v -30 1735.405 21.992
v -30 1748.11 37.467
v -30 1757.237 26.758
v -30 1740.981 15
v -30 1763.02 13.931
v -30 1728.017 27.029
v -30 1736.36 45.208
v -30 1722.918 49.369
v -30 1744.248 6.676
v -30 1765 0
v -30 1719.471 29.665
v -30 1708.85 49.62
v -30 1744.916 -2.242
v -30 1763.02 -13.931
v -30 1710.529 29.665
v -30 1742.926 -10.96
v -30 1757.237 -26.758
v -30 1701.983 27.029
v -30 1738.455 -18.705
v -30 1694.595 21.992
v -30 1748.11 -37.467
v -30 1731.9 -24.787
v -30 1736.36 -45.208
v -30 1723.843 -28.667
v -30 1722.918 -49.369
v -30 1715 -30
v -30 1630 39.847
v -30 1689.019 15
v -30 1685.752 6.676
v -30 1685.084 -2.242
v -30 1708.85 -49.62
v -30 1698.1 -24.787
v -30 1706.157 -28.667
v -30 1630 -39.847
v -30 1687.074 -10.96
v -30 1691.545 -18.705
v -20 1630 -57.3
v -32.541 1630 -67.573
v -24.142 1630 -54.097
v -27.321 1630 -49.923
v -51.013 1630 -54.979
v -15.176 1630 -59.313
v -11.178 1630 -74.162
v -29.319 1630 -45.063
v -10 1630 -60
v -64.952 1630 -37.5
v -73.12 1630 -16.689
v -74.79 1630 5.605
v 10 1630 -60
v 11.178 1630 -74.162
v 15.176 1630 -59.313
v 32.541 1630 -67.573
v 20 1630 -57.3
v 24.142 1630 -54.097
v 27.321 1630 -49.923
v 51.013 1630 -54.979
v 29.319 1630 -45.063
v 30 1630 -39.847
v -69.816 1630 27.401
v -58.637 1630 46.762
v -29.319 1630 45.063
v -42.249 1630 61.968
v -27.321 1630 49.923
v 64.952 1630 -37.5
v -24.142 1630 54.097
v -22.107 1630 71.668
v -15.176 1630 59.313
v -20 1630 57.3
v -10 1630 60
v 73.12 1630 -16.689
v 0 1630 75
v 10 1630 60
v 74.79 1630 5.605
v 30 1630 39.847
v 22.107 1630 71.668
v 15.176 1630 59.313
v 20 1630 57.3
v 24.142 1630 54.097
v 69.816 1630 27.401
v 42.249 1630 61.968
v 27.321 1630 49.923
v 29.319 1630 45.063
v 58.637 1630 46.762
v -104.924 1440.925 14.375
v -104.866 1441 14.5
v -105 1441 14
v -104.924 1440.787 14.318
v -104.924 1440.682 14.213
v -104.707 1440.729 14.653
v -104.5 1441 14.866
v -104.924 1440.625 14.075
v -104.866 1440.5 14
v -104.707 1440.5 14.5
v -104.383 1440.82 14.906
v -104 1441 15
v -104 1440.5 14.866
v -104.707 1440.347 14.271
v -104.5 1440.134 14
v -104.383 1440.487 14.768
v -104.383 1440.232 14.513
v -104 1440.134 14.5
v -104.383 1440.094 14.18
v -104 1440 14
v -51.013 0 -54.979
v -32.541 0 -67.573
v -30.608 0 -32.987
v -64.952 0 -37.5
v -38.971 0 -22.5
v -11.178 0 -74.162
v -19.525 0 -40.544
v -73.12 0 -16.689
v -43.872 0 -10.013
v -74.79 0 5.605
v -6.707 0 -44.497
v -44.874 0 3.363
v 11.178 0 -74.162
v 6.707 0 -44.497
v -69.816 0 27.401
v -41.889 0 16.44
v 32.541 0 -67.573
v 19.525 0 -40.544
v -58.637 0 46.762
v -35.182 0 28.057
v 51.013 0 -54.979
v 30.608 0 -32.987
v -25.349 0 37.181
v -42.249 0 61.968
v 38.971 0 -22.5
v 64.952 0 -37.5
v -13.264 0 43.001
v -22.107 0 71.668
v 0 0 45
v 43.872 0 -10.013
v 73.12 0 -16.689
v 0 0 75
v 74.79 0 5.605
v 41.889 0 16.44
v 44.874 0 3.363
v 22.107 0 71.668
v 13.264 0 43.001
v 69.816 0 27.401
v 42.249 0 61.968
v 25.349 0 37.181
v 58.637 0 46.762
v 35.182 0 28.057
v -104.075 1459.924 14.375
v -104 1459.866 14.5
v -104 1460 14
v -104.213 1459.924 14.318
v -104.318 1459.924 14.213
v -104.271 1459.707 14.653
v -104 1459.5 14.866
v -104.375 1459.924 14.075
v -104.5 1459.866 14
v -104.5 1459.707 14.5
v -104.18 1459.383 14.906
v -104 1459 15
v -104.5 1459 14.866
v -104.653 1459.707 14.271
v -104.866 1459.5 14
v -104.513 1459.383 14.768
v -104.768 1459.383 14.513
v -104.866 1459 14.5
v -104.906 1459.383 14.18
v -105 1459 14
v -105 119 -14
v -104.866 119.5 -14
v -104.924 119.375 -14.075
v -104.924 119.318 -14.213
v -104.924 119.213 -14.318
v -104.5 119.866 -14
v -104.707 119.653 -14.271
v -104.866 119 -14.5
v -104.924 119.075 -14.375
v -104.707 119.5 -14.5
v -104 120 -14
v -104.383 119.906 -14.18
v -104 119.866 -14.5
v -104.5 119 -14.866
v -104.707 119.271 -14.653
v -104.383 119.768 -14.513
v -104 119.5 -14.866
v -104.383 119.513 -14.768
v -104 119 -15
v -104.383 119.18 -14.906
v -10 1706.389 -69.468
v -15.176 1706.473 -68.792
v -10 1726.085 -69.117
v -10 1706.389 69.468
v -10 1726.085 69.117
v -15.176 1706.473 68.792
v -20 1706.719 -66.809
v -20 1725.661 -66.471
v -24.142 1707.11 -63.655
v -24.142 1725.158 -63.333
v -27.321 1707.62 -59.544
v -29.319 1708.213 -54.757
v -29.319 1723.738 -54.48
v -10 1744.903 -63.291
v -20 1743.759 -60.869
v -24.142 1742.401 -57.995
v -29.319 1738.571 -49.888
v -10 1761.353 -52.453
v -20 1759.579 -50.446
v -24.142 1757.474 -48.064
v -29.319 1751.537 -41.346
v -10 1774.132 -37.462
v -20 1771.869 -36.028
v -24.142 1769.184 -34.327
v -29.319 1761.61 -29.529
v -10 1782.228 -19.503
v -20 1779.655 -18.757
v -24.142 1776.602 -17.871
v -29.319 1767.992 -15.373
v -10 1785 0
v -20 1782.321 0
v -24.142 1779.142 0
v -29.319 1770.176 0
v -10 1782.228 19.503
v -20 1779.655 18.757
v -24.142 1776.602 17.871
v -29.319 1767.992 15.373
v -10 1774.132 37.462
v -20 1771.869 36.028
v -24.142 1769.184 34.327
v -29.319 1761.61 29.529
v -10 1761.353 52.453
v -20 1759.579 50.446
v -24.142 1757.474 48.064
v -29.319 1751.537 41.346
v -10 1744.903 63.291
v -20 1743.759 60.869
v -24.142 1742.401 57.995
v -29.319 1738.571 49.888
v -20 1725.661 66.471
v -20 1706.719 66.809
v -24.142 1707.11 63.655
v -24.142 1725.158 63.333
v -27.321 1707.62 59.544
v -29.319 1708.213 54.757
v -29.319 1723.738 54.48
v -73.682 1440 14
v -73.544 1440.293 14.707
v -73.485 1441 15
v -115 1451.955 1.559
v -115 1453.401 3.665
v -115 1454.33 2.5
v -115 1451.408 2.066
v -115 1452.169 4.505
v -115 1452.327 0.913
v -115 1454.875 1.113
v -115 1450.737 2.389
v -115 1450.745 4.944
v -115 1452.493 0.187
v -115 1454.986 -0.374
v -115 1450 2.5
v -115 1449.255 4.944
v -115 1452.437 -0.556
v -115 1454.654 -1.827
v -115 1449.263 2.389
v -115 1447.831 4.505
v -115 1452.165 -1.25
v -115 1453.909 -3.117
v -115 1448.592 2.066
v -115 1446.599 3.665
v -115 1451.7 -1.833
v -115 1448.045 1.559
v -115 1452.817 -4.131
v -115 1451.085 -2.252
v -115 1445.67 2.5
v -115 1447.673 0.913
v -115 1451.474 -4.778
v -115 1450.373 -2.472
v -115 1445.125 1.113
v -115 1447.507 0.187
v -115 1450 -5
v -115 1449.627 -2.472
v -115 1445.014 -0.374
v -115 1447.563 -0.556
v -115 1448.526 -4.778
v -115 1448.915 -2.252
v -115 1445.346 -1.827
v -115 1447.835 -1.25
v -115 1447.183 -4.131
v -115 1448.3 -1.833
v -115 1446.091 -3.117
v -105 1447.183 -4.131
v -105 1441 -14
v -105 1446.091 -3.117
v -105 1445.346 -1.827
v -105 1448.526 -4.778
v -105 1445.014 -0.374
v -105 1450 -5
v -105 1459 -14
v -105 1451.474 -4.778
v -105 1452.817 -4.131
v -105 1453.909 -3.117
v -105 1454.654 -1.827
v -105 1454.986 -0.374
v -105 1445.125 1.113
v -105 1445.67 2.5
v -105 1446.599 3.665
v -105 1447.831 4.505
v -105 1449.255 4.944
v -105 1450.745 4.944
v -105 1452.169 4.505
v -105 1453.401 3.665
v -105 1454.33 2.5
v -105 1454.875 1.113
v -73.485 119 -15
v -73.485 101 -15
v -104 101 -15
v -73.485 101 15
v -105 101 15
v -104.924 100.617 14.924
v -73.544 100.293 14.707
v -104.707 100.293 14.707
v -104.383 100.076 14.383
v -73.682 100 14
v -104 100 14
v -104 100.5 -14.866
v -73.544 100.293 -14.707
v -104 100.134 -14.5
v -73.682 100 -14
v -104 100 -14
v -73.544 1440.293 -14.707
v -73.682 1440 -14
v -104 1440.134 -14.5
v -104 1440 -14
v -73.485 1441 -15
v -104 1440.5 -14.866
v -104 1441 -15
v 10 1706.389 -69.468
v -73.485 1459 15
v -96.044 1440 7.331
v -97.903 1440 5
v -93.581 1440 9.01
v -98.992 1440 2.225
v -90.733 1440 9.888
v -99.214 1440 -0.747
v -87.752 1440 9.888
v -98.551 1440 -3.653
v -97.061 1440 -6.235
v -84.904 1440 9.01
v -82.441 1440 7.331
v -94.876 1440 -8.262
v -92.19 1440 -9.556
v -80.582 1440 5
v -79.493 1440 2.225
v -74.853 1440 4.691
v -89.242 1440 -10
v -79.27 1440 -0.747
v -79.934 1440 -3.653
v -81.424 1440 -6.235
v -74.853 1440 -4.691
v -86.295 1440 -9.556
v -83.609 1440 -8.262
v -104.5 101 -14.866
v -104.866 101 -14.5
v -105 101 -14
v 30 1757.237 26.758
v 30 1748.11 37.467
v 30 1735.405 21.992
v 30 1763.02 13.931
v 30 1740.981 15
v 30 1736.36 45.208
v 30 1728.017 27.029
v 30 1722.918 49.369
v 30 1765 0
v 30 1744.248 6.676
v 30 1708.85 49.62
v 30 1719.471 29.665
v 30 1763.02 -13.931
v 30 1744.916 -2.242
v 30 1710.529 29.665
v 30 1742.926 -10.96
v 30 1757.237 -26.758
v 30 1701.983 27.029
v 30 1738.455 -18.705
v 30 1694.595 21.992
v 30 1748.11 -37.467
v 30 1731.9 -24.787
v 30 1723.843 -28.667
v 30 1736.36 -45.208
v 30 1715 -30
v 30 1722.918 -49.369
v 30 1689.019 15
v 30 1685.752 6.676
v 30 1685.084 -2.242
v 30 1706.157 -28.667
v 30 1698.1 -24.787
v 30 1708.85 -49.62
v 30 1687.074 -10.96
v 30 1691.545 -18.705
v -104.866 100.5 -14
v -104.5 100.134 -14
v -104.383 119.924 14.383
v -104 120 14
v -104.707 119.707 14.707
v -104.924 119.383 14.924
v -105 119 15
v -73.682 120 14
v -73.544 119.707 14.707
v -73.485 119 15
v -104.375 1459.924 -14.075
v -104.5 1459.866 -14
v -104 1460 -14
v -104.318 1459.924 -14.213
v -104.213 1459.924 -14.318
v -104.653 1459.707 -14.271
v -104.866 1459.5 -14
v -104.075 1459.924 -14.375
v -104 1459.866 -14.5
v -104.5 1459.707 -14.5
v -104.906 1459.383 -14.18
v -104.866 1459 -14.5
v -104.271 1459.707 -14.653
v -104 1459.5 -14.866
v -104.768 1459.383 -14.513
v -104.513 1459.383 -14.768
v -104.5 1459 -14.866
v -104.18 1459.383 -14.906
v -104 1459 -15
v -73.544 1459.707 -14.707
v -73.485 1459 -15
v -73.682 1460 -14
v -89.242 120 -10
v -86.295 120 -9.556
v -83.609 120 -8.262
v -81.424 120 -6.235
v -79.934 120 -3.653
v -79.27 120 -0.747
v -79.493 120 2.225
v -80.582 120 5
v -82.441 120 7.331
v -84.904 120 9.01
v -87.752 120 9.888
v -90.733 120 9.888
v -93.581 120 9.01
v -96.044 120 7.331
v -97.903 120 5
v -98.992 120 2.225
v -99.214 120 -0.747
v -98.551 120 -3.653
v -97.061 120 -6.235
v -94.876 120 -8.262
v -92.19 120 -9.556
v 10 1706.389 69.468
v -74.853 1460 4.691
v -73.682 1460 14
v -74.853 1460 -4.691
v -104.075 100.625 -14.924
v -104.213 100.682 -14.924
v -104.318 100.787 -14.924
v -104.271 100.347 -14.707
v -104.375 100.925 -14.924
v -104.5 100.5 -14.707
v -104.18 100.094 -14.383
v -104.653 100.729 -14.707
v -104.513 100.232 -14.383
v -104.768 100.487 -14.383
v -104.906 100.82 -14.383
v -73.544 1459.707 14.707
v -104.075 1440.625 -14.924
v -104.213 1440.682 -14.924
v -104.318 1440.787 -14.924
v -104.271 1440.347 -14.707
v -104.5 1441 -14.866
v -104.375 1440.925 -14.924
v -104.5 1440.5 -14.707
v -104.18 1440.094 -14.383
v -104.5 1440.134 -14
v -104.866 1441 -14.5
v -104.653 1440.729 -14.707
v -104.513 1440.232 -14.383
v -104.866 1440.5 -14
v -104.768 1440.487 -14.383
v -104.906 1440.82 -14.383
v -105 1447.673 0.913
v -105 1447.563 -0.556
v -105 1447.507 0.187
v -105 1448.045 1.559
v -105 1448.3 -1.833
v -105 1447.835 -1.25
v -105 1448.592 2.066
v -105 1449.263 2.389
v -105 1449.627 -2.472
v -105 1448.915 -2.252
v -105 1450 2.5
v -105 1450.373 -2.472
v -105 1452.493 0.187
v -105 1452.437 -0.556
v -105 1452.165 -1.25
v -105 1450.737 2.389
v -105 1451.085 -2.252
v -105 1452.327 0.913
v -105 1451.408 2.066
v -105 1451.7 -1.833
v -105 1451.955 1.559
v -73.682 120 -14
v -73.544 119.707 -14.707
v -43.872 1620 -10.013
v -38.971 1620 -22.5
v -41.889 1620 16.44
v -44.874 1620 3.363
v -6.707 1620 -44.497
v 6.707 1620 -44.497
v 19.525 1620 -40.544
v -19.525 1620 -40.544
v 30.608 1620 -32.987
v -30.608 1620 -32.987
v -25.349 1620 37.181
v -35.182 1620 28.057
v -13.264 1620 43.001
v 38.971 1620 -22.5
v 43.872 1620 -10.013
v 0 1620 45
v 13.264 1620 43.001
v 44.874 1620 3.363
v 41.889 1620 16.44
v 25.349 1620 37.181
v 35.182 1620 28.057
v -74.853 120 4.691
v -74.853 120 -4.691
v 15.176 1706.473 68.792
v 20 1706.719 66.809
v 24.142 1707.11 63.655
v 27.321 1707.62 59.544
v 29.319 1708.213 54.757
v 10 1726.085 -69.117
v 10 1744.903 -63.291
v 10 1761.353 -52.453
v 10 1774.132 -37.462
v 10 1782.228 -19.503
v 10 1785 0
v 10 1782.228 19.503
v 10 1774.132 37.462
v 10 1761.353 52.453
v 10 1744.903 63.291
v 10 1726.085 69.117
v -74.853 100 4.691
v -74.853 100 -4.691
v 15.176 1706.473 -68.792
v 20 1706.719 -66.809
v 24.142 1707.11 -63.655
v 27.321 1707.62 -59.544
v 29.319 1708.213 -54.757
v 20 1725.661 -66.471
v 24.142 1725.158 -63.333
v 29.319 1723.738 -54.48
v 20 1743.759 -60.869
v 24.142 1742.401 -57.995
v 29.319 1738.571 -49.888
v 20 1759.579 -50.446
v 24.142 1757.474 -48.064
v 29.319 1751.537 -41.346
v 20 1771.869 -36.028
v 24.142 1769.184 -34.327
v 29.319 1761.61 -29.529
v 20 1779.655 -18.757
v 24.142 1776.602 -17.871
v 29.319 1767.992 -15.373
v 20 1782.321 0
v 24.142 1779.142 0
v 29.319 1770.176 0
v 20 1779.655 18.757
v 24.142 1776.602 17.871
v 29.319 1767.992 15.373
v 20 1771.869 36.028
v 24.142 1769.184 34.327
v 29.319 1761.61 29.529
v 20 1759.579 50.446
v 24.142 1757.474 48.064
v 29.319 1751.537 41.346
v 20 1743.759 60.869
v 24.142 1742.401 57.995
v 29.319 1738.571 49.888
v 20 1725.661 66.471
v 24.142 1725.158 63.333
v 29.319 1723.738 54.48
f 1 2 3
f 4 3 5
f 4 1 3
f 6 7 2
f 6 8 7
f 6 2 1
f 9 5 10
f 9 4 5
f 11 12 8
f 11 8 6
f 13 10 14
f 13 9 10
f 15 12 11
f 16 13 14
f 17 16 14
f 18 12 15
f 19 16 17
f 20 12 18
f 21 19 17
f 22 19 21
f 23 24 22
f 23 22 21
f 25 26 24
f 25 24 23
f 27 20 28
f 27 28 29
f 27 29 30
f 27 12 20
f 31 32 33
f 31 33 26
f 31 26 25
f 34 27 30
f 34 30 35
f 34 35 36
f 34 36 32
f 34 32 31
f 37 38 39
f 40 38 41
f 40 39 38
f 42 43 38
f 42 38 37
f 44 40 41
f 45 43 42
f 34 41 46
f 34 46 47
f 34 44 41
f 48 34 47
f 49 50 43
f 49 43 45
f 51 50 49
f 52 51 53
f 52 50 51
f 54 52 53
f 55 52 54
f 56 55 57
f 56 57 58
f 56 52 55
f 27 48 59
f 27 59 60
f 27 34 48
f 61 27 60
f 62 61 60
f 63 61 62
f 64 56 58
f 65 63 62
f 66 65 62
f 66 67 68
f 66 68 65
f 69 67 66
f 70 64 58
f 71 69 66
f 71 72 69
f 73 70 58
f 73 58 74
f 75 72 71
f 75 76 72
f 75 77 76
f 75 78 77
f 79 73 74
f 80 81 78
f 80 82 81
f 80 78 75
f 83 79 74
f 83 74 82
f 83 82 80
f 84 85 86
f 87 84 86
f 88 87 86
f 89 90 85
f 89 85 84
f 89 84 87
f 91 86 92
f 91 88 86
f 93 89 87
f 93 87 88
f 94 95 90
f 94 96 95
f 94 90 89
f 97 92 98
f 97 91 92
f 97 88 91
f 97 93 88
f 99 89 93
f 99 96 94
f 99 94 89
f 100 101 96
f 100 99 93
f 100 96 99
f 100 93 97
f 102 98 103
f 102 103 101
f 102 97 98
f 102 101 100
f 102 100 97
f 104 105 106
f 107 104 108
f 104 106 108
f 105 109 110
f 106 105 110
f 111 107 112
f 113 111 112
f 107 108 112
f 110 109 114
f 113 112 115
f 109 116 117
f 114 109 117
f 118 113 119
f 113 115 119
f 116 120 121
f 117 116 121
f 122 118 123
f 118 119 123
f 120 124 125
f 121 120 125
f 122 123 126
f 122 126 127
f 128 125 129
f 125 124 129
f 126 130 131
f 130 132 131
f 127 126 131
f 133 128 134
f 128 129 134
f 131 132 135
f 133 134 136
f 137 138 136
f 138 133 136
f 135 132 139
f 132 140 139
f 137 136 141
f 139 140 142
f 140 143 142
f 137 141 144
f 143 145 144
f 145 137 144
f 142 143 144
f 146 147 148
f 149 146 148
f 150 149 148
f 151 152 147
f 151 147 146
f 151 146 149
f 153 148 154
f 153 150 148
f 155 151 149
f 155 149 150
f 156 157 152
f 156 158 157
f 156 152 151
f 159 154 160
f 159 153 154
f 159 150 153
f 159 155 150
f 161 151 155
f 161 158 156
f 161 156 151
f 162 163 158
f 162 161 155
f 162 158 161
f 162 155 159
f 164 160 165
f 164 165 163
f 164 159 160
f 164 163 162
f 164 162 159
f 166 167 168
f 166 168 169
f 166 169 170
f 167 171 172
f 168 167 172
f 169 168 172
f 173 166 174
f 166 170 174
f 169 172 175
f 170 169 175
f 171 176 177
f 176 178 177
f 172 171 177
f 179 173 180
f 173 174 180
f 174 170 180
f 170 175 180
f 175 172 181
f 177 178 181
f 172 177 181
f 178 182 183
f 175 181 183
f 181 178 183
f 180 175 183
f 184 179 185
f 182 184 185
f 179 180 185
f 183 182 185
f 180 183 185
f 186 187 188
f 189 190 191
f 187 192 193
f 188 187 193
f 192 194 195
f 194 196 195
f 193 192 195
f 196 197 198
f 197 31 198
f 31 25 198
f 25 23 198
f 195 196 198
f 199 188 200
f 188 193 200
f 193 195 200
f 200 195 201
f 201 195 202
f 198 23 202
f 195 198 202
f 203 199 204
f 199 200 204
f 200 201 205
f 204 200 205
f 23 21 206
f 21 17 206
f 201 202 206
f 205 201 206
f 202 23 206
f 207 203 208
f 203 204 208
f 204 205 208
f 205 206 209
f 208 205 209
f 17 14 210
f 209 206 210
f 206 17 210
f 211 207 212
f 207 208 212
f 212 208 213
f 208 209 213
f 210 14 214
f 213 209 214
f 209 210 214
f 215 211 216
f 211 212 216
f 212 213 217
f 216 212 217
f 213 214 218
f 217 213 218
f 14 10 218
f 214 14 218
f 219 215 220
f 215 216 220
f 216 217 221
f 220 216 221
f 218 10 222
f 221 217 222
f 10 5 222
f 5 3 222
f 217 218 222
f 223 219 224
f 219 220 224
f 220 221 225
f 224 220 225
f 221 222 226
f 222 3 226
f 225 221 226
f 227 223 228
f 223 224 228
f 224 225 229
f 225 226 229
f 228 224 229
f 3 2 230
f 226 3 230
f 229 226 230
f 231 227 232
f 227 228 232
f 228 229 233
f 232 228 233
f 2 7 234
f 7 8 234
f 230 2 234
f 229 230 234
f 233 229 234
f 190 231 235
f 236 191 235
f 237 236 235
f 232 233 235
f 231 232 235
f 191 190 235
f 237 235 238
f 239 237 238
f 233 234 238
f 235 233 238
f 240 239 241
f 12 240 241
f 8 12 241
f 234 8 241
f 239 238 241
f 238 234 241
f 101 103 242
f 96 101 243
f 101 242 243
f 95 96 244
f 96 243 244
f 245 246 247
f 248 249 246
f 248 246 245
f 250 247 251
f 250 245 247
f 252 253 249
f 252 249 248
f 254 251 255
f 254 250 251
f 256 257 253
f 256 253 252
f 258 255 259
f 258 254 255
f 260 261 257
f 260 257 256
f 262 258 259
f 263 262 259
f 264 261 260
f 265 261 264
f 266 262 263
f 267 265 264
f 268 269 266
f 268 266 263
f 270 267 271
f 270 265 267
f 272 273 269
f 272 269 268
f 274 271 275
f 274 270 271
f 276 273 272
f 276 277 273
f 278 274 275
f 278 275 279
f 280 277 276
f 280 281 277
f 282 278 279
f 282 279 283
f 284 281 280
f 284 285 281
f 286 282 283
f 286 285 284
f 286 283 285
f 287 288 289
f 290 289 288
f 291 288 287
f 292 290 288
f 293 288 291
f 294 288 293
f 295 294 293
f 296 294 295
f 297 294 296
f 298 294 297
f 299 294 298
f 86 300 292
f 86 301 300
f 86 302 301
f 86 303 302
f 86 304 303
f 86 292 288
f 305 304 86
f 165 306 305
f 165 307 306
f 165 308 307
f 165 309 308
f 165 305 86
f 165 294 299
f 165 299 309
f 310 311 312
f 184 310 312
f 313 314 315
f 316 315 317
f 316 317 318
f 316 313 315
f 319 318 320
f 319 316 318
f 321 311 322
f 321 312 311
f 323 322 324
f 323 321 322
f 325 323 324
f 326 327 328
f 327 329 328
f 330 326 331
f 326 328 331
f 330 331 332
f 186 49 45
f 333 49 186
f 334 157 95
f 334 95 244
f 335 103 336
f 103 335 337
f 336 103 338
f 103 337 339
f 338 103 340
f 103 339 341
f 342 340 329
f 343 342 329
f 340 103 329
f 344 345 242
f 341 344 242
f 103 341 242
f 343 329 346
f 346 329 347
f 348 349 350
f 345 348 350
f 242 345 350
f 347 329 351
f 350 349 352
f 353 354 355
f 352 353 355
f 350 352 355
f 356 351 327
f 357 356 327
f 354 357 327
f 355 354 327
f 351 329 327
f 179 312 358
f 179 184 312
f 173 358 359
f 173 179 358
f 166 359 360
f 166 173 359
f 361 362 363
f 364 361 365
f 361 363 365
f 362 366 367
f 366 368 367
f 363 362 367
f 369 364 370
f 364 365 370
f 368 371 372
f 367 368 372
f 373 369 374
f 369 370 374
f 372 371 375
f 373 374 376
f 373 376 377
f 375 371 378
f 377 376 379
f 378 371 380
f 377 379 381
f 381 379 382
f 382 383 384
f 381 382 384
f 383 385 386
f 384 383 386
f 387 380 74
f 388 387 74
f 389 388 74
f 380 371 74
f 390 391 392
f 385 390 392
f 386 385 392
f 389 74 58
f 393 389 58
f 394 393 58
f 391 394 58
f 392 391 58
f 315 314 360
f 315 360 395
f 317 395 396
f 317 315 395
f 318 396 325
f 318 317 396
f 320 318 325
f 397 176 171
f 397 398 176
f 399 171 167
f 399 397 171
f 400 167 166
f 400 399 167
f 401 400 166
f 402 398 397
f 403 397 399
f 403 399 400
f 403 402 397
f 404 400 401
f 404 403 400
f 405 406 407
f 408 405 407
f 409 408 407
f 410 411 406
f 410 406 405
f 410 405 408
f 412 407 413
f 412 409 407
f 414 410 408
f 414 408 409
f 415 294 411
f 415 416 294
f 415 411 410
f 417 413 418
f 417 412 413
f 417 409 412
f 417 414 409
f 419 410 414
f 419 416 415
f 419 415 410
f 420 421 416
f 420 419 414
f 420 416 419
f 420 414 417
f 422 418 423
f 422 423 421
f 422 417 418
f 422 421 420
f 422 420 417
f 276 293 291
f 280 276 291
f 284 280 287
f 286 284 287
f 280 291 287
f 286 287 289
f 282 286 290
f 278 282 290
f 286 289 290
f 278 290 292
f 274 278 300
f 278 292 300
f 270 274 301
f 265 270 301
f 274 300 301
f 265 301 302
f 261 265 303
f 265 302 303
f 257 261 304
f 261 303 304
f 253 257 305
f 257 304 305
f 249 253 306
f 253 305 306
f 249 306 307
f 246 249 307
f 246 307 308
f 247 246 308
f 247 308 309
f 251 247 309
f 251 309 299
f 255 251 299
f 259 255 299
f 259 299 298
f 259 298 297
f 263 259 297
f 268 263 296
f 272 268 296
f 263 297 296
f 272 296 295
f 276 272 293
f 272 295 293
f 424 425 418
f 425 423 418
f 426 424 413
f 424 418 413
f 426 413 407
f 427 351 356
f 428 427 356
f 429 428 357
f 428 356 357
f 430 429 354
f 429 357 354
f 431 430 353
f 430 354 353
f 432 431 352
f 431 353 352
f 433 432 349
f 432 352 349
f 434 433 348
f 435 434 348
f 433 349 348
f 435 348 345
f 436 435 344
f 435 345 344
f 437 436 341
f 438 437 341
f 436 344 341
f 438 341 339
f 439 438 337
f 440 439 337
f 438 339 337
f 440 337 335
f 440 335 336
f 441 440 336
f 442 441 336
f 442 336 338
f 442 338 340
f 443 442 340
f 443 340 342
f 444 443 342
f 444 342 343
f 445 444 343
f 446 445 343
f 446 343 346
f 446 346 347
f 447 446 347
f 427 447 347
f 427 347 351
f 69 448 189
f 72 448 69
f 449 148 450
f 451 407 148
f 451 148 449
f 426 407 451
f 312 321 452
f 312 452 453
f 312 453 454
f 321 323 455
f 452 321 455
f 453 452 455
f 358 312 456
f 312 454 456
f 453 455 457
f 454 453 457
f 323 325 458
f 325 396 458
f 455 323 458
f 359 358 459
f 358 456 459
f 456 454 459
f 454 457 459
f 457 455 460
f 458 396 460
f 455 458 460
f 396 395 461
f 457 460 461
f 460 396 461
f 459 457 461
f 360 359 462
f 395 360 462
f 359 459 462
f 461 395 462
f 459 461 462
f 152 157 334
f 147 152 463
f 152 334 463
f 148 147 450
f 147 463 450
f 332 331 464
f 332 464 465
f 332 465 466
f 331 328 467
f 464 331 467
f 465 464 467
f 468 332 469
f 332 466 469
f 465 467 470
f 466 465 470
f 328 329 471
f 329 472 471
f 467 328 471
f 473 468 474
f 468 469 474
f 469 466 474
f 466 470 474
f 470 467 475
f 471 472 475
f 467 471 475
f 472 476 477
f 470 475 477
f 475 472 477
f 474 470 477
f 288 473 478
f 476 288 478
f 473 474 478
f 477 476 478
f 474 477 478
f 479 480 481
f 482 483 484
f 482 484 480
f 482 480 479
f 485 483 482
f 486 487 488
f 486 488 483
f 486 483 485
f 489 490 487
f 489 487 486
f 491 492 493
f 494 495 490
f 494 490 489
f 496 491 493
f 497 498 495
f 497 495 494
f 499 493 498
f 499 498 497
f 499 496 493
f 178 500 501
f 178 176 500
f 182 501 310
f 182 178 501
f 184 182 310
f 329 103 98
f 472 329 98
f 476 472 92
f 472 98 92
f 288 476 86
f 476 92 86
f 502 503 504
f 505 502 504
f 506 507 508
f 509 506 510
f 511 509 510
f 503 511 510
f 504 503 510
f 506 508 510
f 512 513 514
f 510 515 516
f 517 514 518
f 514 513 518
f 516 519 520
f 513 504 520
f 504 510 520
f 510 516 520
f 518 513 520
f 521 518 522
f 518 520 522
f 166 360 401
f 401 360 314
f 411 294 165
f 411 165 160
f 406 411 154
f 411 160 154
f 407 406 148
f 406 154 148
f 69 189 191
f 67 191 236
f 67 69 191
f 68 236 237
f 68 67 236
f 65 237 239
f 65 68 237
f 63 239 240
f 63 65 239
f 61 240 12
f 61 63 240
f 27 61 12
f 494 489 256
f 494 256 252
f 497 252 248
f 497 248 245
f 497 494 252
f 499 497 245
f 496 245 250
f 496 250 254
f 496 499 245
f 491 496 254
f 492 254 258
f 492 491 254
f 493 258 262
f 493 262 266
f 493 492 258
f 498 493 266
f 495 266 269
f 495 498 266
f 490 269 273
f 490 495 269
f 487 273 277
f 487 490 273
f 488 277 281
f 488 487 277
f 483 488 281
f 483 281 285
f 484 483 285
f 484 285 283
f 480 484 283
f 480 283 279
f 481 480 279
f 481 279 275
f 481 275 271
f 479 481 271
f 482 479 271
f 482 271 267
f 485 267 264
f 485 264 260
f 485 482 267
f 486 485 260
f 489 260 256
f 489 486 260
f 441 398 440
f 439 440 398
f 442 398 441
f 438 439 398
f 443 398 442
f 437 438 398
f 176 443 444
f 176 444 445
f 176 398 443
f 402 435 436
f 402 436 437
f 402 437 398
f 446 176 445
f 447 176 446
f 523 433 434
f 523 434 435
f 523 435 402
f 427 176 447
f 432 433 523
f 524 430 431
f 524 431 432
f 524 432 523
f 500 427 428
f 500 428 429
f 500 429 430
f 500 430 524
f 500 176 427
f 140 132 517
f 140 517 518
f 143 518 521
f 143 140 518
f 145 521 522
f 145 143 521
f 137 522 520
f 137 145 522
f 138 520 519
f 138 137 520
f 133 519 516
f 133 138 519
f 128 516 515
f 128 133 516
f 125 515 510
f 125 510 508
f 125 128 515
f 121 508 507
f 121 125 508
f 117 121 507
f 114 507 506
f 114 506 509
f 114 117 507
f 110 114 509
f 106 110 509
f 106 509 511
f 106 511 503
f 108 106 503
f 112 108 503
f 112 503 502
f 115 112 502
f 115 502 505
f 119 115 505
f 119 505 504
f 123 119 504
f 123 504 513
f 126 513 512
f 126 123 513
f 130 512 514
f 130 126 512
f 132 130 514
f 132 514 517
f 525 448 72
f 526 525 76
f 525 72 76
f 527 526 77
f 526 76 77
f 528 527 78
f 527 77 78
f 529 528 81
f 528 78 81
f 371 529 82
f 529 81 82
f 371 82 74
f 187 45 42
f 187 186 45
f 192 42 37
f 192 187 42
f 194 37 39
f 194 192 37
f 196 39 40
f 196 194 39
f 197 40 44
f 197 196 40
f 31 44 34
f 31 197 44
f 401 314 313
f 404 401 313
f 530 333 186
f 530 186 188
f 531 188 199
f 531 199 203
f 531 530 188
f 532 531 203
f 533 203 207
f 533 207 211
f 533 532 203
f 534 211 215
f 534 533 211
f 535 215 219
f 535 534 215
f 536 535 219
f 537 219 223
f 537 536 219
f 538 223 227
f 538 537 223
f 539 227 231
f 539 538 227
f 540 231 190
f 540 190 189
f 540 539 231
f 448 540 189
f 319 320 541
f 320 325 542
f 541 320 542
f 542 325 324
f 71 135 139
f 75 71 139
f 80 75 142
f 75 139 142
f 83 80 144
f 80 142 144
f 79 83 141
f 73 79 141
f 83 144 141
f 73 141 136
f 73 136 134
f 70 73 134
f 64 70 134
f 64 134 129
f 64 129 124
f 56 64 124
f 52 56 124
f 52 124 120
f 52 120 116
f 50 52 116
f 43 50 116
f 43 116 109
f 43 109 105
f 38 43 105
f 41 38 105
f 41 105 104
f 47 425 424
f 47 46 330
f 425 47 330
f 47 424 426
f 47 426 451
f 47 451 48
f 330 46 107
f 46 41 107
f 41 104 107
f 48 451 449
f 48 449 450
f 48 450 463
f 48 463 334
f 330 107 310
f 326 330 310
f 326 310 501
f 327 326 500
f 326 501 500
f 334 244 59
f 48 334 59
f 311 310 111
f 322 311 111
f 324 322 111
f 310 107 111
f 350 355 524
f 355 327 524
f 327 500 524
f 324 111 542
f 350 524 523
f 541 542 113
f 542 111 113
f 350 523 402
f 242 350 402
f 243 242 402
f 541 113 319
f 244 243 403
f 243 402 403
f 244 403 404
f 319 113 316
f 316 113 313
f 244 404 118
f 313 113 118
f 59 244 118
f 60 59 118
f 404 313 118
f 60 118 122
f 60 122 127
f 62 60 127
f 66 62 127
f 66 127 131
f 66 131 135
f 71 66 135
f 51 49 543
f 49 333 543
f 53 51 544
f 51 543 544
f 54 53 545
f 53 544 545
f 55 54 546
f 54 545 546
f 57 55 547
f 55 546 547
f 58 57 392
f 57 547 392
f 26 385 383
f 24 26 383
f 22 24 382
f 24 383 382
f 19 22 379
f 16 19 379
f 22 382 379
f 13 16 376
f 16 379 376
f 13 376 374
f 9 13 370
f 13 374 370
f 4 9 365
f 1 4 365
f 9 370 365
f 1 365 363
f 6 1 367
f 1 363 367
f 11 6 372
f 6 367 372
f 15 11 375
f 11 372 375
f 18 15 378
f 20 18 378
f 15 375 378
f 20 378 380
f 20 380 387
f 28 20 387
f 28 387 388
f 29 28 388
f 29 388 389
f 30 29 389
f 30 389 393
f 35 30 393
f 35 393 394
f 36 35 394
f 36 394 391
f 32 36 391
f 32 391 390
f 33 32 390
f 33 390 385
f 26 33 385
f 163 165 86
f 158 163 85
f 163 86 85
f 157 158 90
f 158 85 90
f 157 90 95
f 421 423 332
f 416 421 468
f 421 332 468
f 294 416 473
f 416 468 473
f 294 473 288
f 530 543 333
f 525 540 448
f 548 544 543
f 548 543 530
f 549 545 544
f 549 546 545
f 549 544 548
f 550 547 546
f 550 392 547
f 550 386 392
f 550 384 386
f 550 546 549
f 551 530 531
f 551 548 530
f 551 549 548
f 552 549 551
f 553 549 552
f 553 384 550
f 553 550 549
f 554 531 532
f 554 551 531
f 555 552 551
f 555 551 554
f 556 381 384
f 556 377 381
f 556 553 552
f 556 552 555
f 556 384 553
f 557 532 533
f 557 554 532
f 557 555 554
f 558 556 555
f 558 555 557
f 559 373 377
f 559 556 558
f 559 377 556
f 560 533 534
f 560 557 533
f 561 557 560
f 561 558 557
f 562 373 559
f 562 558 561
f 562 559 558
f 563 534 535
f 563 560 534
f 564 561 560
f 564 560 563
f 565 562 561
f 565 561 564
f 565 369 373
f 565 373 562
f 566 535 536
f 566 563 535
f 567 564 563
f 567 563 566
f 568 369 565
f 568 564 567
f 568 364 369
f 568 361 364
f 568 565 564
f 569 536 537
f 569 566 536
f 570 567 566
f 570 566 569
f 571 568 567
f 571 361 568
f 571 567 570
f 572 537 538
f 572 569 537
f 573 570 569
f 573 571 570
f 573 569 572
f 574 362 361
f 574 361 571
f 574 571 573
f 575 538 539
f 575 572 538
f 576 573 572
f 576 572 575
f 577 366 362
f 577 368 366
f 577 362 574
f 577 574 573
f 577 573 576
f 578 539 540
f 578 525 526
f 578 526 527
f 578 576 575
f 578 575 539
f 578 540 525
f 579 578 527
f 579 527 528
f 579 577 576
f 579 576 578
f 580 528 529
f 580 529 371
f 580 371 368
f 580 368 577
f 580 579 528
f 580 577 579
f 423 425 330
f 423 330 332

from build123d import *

# Parameters (mm, degrees)
SKETCH_1_R          = 75
SKETCH_1_R_2        = 45
EXTRUDE_1_DEPTH     = 1620
SKETCH_2_R          = 75
EXTRUDE_2_DEPTH     = 10
SKETCH_3_W          = 60
SKETCH_3_H          = 150
EXTRUDE_3_DEPTH     = 200
SKETCH_4_R          = 30
CUT_EXTRUDE_1_DEPTH = 1835.543539958
FILLET_1_R          = 20
EXTRUDE_4_DEPTH     = 20
SKETCH_6_R          = 10
EXTRUDE_5_DEPTH     = 660
SKETCH_10_R         = 5
SKETCH_10_R_2       = 2.5
EXTRUDE_6_DEPTH     = 10
FILLET_2_R          = 1


with BuildPart() as part:
    # 草图1 → 凸台-拉伸1 (new body)
    with BuildSketch(Plane(origin=(0, 0, 0), x_dir=(1, 0, 0), z_dir=(0, 1, 0))):
        with Locations(Location((0, 0, 0), (0, 0, 270))):
            Circle(SKETCH_1_R)
        with Locations(Location((0, 0, 0), (0, 0, 270))):
            Circle(SKETCH_1_R_2, mode=Mode.SUBTRACT)
    extrude(amount=EXTRUDE_1_DEPTH)

    # 草图2 → 凸台-拉伸2 (add)
    with BuildSketch(Plane(origin=(0, 1620, 0), x_dir=(1, 0, 0), z_dir=(0, 1, 0))):
        with Locations(Location((0, 0, 0), (0, 0, 270))):
            Circle(SKETCH_2_R)
    extrude(amount=EXTRUDE_2_DEPTH)

    # 草图3 → 凸台-拉伸3 (add)
    with BuildSketch(Plane(origin=(0, 1630, 0), x_dir=(1, 0, 0), z_dir=(0, 1, 0))):
        Rectangle(SKETCH_3_W, SKETCH_3_H)
    extrude(amount=EXTRUDE_3_DEPTH)

    # 草图4 → 切除-拉伸1 (cut, through all)
    with BuildSketch(Plane(origin=(30, 0, 0), x_dir=(0, 0, -1), z_dir=(1, 0, 0))):
        with Locations((0, 1715)):
            Circle(SKETCH_4_R)
        with BuildLine():
            Line((75, 1830), (75, 1630))
            Line((75, 1630), (60, 1630))
            Line((60, 1630), (69.468399859, 1706.389458724))
            ThreePointArc((69.468399859, 1706.389458724), (0, 1785), (-69.468399859, 1706.389458724))
            Line((-69.468399859, 1706.389458724), (-60, 1630))
            Line((-60, 1630), (-75, 1630))
            Line((-75, 1630), (-75, 1830))
            Line((-75, 1830), (75, 1830))
        make_face()
    extrude(amount=-CUT_EXTRUDE_1_DEPTH, mode=Mode.SUBTRACT)

    # 圆角1
    fillet_1_edges = [part.edges().sort_by_distance(p)[0] for p in [
        (-30, 1785, 0),
        (-30, 1668.194729362, 64.734199929),
        (-30, 1668.194729362, -64.734199929),
        (30, 1785, 0),
        (30, 1668.194729362, -64.734199929),
        (30, 1668.194729362, 64.734199929),
    ]]
    fillet(fillet_1_edges, radius=FILLET_1_R)

    # 草图5 → 凸台-拉伸4 (add)
    with BuildSketch(Plane(origin=(0, 100, 0), x_dir=(-1, 0, 0), z_dir=(0, -1, 0))):
        with BuildLine():
            Line((73.484692283, 15), (105, 15))
            Line((105, 15), (105, -15))
            Line((105, -15), (73.484692283, -15))
            ThreePointArc((73.484692283, -15), (75, 0), (73.484692283, 15))
        make_face()
    extrude_4 = extrude(amount=-EXTRUDE_4_DEPTH)

    # 草图6 → 凸台-拉伸5 (add)
    with BuildSketch(Plane(origin=(0, 120, 0), x_dir=(-1, 0, 0), z_dir=(0, -1, 0))):
        with Locations(Location((89.242346142, 0, 0), (0, 0, 90))):
            Circle(SKETCH_6_R)
    extrude_5 = extrude(amount=-EXTRUDE_5_DEPTH)

    # 镜向2: 凸台-拉伸4, 凸台-拉伸5 across plane
    add(extrude_4.mirror(Plane(origin=(-89.242346142, 780, 0), x_dir=(0, 0, 1), z_dir=(0, -1, 0))))
    add(extrude_5.mirror(Plane(origin=(-89.242346142, 780, 0), x_dir=(0, 0, 1), z_dir=(0, -1, 0))))

    # 草图10 → 凸台-拉伸6 (add)
    with BuildSketch(Plane.ZY.offset(105)):
        with Locations(Location((0, 1450, 0), (0, 0, 180))):
            Circle(SKETCH_10_R)
        with Locations((0, 1450)):
            Circle(SKETCH_10_R_2, mode=Mode.SUBTRACT)
    extrude(amount=EXTRUDE_6_DEPTH)

    # 圆角2
    fillet_2_edges = [part.edges().sort_by_distance(p)[0] for p in [
        (-89.242346142, 1440, 15),
        (-105, 1450, 15),
        (-89.242346142, 1460, 15),
        (-105, 1440, 0),
        (-89.242346142, 1440, -15),
        (-105, 1450, -15),
        (-105, 1460, 0),
        (-89.242346142, 1460, -15),
        (-89.242346142, 100, 15),
        (-89.242346142, 120, 15),
        (-105, 100, 0),
        (-89.242346142, 100, -15),
        (-89.242346142, 120, -15),
        (-105, 120, 0),
        (-105, 110, -15),
    ]]
    fillet(fillet_2_edges, radius=FILLET_2_R)


solid = part.part
